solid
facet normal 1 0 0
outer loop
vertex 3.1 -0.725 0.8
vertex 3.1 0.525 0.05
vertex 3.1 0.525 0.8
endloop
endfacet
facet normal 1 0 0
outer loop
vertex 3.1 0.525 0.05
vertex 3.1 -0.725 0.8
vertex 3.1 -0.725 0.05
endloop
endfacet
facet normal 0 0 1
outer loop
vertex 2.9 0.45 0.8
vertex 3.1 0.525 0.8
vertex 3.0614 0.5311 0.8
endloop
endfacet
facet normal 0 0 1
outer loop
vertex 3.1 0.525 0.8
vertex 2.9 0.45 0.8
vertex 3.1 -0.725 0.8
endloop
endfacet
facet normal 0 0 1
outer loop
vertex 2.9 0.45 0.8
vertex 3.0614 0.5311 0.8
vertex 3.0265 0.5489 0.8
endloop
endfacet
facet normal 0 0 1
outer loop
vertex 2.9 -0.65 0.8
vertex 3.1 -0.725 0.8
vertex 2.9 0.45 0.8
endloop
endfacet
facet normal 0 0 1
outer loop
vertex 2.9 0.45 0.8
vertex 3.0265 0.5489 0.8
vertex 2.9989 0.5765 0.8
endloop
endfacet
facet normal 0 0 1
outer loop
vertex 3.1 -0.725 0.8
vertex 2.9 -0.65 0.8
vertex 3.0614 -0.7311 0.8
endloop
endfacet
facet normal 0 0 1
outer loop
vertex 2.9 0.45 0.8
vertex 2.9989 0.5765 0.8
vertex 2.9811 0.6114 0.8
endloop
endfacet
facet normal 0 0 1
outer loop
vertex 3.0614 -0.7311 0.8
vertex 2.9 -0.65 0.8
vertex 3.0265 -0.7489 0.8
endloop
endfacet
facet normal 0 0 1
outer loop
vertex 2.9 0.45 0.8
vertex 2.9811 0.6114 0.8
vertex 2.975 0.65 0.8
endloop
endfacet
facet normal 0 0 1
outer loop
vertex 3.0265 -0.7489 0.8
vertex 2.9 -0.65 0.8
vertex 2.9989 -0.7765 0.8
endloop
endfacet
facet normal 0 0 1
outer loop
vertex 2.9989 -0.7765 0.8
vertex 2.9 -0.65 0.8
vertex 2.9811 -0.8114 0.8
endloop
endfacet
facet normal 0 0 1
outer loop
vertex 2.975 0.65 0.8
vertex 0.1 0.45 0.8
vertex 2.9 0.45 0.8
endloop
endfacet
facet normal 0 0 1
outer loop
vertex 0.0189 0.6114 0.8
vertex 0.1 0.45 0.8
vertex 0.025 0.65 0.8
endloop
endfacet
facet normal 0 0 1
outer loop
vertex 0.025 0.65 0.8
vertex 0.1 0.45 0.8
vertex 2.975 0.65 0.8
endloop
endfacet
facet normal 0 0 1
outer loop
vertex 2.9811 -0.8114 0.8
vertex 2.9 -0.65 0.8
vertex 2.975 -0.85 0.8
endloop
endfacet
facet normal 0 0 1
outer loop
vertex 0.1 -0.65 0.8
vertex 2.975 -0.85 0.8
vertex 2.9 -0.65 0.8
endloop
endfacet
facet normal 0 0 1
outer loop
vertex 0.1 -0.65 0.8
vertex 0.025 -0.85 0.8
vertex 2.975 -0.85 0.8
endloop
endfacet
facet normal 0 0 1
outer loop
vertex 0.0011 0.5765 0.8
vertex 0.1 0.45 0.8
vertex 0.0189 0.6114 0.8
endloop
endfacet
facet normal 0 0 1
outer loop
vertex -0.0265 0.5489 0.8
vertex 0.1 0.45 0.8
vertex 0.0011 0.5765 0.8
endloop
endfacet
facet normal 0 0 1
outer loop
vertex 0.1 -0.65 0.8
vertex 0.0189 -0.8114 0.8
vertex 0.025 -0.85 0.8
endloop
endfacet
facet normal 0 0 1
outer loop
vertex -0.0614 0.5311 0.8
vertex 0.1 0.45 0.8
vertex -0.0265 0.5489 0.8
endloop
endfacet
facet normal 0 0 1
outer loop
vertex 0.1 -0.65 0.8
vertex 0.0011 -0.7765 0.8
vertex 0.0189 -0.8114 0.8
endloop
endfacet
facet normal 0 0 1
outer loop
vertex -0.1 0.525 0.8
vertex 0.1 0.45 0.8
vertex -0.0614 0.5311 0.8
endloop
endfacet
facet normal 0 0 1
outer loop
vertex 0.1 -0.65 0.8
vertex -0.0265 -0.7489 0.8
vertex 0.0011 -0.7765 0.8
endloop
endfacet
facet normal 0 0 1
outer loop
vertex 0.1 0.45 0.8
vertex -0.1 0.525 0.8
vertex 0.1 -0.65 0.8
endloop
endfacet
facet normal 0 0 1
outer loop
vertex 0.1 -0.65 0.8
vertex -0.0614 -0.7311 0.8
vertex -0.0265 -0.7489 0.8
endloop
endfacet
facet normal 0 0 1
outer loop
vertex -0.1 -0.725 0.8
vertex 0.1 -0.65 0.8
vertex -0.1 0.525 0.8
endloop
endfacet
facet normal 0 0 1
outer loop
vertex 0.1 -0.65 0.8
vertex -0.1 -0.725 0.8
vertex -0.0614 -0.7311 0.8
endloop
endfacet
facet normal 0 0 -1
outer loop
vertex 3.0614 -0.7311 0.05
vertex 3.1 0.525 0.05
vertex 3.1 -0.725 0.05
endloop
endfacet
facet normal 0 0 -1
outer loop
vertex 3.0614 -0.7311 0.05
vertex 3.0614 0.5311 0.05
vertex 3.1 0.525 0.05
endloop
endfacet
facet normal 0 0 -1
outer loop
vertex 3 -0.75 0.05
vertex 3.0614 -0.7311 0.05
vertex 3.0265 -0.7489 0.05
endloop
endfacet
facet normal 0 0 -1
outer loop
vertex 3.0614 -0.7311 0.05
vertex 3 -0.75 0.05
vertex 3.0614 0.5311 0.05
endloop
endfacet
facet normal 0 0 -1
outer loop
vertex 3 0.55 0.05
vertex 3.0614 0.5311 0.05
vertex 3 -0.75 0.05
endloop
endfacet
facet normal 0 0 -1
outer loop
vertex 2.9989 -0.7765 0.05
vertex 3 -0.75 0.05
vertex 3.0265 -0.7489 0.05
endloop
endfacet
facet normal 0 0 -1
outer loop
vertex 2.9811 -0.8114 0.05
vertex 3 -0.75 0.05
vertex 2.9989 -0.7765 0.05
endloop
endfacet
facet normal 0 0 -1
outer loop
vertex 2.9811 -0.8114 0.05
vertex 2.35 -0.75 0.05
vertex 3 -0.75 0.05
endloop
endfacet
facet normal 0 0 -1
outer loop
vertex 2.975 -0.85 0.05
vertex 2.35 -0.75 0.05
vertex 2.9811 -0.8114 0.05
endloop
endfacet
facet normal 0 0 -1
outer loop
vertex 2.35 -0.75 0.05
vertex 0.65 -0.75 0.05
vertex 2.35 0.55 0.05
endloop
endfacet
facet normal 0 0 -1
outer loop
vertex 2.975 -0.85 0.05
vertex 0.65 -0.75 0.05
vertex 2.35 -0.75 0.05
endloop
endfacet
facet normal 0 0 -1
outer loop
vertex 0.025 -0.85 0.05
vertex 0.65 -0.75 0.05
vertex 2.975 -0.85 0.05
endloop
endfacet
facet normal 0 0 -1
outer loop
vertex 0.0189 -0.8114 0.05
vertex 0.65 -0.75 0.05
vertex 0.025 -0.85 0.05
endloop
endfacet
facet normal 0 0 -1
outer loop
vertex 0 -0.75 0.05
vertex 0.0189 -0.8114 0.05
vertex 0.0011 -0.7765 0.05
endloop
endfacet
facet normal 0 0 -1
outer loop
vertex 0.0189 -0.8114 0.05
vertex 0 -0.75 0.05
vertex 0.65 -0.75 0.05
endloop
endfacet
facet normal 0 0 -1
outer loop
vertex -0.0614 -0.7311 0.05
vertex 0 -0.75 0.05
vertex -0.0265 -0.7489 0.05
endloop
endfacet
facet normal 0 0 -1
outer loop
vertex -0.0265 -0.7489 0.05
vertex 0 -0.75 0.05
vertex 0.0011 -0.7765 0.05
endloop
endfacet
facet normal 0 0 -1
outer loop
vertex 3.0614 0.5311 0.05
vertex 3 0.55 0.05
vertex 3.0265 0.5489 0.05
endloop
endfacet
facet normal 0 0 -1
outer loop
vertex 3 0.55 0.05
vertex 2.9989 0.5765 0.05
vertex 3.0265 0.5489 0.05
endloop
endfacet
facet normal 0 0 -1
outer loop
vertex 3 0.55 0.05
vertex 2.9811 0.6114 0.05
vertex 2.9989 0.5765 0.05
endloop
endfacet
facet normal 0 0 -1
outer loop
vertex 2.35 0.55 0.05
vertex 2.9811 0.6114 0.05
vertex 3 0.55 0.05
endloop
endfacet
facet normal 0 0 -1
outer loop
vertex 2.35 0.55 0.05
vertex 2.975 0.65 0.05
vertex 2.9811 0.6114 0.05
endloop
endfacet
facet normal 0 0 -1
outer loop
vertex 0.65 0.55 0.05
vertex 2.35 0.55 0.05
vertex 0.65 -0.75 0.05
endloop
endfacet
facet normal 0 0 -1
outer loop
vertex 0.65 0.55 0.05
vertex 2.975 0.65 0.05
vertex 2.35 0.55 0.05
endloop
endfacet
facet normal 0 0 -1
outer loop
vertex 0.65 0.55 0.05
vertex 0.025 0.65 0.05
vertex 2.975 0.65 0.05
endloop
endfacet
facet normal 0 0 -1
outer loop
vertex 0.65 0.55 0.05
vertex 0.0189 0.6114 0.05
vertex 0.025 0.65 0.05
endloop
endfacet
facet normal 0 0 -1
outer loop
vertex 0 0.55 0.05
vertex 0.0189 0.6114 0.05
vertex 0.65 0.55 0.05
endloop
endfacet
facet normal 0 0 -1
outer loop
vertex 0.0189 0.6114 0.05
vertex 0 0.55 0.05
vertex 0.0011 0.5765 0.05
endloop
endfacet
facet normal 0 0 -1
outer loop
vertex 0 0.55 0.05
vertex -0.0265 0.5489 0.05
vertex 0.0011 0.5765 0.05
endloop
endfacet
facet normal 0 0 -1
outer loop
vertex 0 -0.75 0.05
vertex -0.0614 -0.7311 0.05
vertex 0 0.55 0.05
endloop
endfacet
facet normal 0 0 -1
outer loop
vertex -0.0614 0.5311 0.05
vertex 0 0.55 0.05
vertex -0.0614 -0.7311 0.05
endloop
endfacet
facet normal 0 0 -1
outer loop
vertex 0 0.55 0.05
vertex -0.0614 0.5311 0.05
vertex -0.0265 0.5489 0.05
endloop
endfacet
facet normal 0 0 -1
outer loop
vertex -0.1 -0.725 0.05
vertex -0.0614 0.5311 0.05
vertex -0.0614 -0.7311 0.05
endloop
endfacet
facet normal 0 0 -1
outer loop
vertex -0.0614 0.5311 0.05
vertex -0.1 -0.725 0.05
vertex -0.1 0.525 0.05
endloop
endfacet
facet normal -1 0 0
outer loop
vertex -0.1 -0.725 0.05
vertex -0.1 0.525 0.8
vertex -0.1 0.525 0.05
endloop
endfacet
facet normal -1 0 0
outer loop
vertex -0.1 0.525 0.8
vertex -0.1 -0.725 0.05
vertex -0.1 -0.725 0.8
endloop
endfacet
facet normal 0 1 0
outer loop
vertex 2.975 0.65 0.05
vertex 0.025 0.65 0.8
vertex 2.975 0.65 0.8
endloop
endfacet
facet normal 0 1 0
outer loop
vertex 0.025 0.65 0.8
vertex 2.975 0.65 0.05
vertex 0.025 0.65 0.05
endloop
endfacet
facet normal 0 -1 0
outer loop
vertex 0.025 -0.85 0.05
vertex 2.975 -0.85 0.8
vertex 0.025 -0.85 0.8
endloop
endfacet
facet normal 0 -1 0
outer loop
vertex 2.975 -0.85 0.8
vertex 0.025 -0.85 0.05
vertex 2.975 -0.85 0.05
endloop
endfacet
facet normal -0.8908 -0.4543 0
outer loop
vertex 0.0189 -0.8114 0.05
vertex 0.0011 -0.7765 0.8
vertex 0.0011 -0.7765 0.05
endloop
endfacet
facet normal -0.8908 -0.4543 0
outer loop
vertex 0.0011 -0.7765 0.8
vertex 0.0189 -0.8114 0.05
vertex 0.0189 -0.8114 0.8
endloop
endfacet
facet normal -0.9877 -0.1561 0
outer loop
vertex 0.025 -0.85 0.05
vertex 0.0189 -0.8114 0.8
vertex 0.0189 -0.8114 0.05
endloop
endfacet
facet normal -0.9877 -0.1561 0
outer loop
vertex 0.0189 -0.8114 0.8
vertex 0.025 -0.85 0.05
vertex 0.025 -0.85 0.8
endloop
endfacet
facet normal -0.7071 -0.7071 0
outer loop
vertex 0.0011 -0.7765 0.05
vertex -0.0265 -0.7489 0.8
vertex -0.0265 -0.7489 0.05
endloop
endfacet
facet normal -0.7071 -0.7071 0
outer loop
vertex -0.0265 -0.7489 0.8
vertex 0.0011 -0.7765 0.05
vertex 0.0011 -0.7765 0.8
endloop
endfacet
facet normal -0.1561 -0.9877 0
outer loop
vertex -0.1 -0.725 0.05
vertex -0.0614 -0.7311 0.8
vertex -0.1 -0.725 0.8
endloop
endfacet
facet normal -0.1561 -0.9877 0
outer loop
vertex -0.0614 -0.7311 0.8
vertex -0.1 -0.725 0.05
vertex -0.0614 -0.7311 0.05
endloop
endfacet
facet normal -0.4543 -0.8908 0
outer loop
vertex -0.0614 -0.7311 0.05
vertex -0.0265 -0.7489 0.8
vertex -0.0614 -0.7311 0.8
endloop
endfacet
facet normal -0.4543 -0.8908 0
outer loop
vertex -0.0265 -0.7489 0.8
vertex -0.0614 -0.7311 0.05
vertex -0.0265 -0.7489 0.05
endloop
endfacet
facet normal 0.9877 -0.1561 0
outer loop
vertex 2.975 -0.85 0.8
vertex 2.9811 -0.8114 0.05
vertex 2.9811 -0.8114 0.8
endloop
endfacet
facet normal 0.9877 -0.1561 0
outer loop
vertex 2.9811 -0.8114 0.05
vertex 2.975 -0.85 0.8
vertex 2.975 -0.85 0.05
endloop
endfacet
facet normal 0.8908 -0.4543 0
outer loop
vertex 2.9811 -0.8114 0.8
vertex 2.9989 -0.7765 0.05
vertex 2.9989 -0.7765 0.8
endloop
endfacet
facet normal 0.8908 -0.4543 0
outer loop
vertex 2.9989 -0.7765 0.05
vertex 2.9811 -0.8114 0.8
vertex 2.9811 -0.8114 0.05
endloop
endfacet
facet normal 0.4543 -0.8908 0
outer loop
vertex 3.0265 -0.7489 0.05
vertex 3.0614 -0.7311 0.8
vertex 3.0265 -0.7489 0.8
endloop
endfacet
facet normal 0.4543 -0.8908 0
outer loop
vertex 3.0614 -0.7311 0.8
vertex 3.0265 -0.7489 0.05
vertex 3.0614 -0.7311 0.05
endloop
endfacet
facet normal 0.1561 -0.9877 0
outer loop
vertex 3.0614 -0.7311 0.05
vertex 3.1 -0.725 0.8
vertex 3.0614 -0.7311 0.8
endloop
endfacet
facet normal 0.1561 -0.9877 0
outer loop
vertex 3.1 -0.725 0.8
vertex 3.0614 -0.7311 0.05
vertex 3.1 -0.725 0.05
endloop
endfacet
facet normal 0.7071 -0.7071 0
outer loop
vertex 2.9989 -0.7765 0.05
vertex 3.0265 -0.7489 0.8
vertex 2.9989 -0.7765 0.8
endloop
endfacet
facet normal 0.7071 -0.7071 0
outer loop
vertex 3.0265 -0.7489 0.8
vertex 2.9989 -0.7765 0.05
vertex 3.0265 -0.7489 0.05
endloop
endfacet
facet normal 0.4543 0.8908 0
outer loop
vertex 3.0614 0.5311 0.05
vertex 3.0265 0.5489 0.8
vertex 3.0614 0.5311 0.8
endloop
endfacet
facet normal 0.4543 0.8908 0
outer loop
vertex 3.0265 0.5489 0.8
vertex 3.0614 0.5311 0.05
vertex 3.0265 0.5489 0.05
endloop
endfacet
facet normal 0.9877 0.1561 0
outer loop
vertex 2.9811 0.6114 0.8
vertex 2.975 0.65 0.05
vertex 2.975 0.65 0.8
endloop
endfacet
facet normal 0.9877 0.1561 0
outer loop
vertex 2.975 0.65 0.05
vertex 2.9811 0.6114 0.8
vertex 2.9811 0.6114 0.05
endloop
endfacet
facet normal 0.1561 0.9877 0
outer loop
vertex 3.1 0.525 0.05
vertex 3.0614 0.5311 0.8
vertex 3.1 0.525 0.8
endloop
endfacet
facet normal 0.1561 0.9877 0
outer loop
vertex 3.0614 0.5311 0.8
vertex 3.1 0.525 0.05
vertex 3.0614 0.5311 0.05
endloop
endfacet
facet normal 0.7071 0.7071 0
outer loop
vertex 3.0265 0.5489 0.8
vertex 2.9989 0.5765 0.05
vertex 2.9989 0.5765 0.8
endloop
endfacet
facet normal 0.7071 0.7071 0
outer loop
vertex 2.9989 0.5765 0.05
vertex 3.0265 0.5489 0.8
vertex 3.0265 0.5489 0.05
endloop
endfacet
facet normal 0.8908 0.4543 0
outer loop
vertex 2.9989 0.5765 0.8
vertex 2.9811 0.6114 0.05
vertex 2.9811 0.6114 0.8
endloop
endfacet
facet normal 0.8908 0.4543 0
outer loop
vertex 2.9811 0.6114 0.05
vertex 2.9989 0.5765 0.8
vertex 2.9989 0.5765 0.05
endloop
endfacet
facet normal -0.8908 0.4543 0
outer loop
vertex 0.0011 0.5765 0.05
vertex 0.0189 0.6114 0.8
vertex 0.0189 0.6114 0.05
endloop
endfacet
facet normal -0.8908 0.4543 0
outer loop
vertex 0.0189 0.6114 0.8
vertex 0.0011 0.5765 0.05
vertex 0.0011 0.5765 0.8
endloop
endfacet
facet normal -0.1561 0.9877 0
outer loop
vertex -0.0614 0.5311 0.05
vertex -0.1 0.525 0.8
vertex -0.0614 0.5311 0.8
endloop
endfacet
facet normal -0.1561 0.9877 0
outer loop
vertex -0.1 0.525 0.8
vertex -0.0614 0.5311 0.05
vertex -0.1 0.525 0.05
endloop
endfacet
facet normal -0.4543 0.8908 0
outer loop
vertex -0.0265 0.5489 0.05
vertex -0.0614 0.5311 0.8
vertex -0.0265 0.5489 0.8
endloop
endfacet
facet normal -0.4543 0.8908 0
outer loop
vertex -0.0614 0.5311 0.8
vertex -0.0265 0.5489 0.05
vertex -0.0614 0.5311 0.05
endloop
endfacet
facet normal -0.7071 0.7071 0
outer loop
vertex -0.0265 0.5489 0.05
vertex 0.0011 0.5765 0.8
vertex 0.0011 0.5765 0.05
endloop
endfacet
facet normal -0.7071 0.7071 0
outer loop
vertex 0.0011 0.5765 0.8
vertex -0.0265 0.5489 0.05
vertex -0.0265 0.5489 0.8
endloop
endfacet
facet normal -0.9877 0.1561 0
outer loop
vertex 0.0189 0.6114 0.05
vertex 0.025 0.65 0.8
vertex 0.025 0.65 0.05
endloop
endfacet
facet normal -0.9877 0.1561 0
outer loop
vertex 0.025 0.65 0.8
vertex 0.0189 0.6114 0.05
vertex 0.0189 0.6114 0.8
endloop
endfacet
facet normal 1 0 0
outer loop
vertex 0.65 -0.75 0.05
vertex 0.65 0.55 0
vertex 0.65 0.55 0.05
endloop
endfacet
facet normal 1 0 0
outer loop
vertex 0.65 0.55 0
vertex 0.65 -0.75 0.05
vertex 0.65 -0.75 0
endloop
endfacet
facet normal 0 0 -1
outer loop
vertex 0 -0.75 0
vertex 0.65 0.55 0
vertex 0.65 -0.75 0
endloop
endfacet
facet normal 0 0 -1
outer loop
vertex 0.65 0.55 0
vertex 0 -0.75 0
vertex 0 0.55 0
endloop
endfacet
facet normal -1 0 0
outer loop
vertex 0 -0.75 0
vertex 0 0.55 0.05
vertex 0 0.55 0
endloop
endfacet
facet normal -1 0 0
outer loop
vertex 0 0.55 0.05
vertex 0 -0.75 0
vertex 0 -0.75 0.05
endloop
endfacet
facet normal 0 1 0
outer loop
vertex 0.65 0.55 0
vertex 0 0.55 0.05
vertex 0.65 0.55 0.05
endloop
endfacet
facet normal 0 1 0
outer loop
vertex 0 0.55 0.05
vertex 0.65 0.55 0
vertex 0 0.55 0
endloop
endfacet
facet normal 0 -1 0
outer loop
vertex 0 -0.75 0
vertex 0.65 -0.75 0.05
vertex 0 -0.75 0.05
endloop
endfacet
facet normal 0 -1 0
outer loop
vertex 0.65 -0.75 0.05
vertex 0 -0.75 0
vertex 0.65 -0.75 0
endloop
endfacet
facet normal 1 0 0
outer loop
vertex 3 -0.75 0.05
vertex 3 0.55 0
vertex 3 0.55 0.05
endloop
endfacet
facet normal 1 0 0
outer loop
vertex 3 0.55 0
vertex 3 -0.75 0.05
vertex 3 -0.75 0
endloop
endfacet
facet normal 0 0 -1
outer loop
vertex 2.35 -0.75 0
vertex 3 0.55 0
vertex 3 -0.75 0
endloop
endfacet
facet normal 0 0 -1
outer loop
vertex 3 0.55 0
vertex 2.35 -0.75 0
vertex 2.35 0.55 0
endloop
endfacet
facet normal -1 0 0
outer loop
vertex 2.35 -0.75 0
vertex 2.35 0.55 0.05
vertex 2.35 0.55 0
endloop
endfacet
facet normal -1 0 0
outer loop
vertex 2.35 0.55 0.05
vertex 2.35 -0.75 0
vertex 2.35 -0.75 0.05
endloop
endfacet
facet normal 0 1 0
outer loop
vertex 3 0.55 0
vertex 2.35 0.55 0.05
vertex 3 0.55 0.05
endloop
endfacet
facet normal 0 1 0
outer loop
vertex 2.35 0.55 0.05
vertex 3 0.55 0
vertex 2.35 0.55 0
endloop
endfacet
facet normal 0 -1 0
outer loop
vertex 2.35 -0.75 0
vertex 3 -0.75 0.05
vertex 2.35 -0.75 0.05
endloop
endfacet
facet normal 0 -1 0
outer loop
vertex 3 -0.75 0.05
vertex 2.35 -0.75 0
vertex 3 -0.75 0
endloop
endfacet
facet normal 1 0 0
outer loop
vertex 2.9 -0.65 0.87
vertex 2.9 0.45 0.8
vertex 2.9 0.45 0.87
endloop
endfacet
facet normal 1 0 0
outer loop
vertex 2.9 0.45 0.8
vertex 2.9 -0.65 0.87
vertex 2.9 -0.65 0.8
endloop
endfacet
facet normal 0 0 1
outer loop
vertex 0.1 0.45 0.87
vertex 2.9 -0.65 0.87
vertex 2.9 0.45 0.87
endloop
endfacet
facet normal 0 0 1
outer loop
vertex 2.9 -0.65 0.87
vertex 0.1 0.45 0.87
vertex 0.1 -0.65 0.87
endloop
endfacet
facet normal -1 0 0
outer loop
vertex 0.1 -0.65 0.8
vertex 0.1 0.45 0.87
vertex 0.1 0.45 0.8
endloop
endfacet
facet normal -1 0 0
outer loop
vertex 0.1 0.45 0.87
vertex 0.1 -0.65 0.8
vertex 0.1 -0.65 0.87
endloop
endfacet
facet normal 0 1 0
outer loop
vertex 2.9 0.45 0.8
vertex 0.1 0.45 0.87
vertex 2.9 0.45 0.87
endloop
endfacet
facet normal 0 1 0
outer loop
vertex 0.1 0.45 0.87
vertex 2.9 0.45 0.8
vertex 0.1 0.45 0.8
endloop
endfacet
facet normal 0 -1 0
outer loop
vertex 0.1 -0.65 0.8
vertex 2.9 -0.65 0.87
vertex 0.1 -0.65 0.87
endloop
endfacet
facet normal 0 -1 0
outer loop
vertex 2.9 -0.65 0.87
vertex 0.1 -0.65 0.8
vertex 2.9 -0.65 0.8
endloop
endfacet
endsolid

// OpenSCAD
pin_x = 0.65;
pin_y = 1.3;
pin_z = 0.05;

case_x = 3.2;
case_y = 1.5;
case_z = 0.75;
case_top_diff = 0.4;
case_top_size_z = 0.07;

delta = 0.01;

color_pins = "#A0A0A0";
color_base = "#A09000";
color_top  = "#D0C000";

module crystal_3215()
{
    translate([0,-case_y/2,0])
    union(){
        union(){
            // case
            color(color_base)
            difference()
            {
                translate([-0.1,-0.1,pin_z])
                    cube(size=[case_x,case_y,case_z]);
            translate([-0.1,-0.1,-delta])
                cylinder(h=case_z+0.1+delta,d=0.25);
            translate([-0.1+case_x,-0.1,-delta])
                cylinder(h=case_z+0.1+delta,d=0.25);
            translate([-0.1+case_x,-0.1+case_y,-delta])
                cylinder(h=case_z+0.1+delta,d=0.25);
            translate([-0.1,-0.1+case_y,-delta])
                cylinder(h=case_z+0.1+delta,d=0.25);
            }

            // pins
            color(color_pins)
            cube(size = [pin_x,pin_y,pin_z], center=false);

            color(color_pins)
            translate([case_x - pin_x - 0.2,0,0])
                cube(size = [pin_x,pin_y,pin_z], center=false);

            // top
            color(color_top)
            translate([-0.1+case_top_diff/2,-0.1+case_top_diff/2,pin_z+case_z])
                cube(size=[case_x-case_top_diff,case_y-case_top_diff,case_top_size_z]);
        }
}
}

crystal_3215($fn=20);
